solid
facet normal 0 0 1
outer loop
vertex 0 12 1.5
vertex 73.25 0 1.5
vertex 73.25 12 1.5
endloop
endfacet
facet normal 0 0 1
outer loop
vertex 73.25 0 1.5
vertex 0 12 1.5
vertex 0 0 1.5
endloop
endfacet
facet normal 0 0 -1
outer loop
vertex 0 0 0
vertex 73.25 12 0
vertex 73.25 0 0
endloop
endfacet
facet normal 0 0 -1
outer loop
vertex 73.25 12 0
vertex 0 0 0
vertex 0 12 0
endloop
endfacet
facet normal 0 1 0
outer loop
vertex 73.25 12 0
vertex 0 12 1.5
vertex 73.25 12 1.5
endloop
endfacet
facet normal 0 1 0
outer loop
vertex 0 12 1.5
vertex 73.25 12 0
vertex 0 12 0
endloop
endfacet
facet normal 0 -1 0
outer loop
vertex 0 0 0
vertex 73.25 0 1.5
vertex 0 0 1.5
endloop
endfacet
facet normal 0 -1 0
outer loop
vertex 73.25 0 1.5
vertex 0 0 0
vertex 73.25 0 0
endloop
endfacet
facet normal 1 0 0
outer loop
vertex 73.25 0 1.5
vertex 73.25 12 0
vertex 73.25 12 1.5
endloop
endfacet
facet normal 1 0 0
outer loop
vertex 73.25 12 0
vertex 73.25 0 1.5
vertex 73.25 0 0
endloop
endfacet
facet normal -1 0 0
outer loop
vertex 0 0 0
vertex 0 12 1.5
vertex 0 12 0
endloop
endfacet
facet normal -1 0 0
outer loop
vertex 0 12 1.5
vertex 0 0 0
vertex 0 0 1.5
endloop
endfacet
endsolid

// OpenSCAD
// Agarose gel comb - a flat plate with a back bar and a row of rectangular teeth for casting
// horizontal gels. NOVEL general part, printed lying flat on the bed.
//

teeth  = 10;
bar_l  = 70;
bar_w  = 12;
teth_w = 5;
teth_l = 12;
gap    = 1.5;
thick  = 1.5;

$fn = 48;

teeth_x = teth_w + gap;
bar_f  = (bar_l - (teeth_x * (teeth - 1))) / 2 + teth_w / 2;   // start X of the first tooth
h      = bar_w;                                               // the spine and teeth share the full width

difference() {
    union() {
        cube([bar_l, bar_w, thick]);                 // back bar
        for (i = [0 : teeth - 1])
            translate([bar_f + i * teeth_x, 0, 0]) cube([teeth_x, teth_l, thick]);   // teeth
    }
    for (i = [0 : teeth - 1])
        translate([bar_f + i * teeth_x, teth_l + 0.01, 0]) cube([teeth_x, teth_l + 0.01, thick]);   // cut through the teeth to form the channels
}
